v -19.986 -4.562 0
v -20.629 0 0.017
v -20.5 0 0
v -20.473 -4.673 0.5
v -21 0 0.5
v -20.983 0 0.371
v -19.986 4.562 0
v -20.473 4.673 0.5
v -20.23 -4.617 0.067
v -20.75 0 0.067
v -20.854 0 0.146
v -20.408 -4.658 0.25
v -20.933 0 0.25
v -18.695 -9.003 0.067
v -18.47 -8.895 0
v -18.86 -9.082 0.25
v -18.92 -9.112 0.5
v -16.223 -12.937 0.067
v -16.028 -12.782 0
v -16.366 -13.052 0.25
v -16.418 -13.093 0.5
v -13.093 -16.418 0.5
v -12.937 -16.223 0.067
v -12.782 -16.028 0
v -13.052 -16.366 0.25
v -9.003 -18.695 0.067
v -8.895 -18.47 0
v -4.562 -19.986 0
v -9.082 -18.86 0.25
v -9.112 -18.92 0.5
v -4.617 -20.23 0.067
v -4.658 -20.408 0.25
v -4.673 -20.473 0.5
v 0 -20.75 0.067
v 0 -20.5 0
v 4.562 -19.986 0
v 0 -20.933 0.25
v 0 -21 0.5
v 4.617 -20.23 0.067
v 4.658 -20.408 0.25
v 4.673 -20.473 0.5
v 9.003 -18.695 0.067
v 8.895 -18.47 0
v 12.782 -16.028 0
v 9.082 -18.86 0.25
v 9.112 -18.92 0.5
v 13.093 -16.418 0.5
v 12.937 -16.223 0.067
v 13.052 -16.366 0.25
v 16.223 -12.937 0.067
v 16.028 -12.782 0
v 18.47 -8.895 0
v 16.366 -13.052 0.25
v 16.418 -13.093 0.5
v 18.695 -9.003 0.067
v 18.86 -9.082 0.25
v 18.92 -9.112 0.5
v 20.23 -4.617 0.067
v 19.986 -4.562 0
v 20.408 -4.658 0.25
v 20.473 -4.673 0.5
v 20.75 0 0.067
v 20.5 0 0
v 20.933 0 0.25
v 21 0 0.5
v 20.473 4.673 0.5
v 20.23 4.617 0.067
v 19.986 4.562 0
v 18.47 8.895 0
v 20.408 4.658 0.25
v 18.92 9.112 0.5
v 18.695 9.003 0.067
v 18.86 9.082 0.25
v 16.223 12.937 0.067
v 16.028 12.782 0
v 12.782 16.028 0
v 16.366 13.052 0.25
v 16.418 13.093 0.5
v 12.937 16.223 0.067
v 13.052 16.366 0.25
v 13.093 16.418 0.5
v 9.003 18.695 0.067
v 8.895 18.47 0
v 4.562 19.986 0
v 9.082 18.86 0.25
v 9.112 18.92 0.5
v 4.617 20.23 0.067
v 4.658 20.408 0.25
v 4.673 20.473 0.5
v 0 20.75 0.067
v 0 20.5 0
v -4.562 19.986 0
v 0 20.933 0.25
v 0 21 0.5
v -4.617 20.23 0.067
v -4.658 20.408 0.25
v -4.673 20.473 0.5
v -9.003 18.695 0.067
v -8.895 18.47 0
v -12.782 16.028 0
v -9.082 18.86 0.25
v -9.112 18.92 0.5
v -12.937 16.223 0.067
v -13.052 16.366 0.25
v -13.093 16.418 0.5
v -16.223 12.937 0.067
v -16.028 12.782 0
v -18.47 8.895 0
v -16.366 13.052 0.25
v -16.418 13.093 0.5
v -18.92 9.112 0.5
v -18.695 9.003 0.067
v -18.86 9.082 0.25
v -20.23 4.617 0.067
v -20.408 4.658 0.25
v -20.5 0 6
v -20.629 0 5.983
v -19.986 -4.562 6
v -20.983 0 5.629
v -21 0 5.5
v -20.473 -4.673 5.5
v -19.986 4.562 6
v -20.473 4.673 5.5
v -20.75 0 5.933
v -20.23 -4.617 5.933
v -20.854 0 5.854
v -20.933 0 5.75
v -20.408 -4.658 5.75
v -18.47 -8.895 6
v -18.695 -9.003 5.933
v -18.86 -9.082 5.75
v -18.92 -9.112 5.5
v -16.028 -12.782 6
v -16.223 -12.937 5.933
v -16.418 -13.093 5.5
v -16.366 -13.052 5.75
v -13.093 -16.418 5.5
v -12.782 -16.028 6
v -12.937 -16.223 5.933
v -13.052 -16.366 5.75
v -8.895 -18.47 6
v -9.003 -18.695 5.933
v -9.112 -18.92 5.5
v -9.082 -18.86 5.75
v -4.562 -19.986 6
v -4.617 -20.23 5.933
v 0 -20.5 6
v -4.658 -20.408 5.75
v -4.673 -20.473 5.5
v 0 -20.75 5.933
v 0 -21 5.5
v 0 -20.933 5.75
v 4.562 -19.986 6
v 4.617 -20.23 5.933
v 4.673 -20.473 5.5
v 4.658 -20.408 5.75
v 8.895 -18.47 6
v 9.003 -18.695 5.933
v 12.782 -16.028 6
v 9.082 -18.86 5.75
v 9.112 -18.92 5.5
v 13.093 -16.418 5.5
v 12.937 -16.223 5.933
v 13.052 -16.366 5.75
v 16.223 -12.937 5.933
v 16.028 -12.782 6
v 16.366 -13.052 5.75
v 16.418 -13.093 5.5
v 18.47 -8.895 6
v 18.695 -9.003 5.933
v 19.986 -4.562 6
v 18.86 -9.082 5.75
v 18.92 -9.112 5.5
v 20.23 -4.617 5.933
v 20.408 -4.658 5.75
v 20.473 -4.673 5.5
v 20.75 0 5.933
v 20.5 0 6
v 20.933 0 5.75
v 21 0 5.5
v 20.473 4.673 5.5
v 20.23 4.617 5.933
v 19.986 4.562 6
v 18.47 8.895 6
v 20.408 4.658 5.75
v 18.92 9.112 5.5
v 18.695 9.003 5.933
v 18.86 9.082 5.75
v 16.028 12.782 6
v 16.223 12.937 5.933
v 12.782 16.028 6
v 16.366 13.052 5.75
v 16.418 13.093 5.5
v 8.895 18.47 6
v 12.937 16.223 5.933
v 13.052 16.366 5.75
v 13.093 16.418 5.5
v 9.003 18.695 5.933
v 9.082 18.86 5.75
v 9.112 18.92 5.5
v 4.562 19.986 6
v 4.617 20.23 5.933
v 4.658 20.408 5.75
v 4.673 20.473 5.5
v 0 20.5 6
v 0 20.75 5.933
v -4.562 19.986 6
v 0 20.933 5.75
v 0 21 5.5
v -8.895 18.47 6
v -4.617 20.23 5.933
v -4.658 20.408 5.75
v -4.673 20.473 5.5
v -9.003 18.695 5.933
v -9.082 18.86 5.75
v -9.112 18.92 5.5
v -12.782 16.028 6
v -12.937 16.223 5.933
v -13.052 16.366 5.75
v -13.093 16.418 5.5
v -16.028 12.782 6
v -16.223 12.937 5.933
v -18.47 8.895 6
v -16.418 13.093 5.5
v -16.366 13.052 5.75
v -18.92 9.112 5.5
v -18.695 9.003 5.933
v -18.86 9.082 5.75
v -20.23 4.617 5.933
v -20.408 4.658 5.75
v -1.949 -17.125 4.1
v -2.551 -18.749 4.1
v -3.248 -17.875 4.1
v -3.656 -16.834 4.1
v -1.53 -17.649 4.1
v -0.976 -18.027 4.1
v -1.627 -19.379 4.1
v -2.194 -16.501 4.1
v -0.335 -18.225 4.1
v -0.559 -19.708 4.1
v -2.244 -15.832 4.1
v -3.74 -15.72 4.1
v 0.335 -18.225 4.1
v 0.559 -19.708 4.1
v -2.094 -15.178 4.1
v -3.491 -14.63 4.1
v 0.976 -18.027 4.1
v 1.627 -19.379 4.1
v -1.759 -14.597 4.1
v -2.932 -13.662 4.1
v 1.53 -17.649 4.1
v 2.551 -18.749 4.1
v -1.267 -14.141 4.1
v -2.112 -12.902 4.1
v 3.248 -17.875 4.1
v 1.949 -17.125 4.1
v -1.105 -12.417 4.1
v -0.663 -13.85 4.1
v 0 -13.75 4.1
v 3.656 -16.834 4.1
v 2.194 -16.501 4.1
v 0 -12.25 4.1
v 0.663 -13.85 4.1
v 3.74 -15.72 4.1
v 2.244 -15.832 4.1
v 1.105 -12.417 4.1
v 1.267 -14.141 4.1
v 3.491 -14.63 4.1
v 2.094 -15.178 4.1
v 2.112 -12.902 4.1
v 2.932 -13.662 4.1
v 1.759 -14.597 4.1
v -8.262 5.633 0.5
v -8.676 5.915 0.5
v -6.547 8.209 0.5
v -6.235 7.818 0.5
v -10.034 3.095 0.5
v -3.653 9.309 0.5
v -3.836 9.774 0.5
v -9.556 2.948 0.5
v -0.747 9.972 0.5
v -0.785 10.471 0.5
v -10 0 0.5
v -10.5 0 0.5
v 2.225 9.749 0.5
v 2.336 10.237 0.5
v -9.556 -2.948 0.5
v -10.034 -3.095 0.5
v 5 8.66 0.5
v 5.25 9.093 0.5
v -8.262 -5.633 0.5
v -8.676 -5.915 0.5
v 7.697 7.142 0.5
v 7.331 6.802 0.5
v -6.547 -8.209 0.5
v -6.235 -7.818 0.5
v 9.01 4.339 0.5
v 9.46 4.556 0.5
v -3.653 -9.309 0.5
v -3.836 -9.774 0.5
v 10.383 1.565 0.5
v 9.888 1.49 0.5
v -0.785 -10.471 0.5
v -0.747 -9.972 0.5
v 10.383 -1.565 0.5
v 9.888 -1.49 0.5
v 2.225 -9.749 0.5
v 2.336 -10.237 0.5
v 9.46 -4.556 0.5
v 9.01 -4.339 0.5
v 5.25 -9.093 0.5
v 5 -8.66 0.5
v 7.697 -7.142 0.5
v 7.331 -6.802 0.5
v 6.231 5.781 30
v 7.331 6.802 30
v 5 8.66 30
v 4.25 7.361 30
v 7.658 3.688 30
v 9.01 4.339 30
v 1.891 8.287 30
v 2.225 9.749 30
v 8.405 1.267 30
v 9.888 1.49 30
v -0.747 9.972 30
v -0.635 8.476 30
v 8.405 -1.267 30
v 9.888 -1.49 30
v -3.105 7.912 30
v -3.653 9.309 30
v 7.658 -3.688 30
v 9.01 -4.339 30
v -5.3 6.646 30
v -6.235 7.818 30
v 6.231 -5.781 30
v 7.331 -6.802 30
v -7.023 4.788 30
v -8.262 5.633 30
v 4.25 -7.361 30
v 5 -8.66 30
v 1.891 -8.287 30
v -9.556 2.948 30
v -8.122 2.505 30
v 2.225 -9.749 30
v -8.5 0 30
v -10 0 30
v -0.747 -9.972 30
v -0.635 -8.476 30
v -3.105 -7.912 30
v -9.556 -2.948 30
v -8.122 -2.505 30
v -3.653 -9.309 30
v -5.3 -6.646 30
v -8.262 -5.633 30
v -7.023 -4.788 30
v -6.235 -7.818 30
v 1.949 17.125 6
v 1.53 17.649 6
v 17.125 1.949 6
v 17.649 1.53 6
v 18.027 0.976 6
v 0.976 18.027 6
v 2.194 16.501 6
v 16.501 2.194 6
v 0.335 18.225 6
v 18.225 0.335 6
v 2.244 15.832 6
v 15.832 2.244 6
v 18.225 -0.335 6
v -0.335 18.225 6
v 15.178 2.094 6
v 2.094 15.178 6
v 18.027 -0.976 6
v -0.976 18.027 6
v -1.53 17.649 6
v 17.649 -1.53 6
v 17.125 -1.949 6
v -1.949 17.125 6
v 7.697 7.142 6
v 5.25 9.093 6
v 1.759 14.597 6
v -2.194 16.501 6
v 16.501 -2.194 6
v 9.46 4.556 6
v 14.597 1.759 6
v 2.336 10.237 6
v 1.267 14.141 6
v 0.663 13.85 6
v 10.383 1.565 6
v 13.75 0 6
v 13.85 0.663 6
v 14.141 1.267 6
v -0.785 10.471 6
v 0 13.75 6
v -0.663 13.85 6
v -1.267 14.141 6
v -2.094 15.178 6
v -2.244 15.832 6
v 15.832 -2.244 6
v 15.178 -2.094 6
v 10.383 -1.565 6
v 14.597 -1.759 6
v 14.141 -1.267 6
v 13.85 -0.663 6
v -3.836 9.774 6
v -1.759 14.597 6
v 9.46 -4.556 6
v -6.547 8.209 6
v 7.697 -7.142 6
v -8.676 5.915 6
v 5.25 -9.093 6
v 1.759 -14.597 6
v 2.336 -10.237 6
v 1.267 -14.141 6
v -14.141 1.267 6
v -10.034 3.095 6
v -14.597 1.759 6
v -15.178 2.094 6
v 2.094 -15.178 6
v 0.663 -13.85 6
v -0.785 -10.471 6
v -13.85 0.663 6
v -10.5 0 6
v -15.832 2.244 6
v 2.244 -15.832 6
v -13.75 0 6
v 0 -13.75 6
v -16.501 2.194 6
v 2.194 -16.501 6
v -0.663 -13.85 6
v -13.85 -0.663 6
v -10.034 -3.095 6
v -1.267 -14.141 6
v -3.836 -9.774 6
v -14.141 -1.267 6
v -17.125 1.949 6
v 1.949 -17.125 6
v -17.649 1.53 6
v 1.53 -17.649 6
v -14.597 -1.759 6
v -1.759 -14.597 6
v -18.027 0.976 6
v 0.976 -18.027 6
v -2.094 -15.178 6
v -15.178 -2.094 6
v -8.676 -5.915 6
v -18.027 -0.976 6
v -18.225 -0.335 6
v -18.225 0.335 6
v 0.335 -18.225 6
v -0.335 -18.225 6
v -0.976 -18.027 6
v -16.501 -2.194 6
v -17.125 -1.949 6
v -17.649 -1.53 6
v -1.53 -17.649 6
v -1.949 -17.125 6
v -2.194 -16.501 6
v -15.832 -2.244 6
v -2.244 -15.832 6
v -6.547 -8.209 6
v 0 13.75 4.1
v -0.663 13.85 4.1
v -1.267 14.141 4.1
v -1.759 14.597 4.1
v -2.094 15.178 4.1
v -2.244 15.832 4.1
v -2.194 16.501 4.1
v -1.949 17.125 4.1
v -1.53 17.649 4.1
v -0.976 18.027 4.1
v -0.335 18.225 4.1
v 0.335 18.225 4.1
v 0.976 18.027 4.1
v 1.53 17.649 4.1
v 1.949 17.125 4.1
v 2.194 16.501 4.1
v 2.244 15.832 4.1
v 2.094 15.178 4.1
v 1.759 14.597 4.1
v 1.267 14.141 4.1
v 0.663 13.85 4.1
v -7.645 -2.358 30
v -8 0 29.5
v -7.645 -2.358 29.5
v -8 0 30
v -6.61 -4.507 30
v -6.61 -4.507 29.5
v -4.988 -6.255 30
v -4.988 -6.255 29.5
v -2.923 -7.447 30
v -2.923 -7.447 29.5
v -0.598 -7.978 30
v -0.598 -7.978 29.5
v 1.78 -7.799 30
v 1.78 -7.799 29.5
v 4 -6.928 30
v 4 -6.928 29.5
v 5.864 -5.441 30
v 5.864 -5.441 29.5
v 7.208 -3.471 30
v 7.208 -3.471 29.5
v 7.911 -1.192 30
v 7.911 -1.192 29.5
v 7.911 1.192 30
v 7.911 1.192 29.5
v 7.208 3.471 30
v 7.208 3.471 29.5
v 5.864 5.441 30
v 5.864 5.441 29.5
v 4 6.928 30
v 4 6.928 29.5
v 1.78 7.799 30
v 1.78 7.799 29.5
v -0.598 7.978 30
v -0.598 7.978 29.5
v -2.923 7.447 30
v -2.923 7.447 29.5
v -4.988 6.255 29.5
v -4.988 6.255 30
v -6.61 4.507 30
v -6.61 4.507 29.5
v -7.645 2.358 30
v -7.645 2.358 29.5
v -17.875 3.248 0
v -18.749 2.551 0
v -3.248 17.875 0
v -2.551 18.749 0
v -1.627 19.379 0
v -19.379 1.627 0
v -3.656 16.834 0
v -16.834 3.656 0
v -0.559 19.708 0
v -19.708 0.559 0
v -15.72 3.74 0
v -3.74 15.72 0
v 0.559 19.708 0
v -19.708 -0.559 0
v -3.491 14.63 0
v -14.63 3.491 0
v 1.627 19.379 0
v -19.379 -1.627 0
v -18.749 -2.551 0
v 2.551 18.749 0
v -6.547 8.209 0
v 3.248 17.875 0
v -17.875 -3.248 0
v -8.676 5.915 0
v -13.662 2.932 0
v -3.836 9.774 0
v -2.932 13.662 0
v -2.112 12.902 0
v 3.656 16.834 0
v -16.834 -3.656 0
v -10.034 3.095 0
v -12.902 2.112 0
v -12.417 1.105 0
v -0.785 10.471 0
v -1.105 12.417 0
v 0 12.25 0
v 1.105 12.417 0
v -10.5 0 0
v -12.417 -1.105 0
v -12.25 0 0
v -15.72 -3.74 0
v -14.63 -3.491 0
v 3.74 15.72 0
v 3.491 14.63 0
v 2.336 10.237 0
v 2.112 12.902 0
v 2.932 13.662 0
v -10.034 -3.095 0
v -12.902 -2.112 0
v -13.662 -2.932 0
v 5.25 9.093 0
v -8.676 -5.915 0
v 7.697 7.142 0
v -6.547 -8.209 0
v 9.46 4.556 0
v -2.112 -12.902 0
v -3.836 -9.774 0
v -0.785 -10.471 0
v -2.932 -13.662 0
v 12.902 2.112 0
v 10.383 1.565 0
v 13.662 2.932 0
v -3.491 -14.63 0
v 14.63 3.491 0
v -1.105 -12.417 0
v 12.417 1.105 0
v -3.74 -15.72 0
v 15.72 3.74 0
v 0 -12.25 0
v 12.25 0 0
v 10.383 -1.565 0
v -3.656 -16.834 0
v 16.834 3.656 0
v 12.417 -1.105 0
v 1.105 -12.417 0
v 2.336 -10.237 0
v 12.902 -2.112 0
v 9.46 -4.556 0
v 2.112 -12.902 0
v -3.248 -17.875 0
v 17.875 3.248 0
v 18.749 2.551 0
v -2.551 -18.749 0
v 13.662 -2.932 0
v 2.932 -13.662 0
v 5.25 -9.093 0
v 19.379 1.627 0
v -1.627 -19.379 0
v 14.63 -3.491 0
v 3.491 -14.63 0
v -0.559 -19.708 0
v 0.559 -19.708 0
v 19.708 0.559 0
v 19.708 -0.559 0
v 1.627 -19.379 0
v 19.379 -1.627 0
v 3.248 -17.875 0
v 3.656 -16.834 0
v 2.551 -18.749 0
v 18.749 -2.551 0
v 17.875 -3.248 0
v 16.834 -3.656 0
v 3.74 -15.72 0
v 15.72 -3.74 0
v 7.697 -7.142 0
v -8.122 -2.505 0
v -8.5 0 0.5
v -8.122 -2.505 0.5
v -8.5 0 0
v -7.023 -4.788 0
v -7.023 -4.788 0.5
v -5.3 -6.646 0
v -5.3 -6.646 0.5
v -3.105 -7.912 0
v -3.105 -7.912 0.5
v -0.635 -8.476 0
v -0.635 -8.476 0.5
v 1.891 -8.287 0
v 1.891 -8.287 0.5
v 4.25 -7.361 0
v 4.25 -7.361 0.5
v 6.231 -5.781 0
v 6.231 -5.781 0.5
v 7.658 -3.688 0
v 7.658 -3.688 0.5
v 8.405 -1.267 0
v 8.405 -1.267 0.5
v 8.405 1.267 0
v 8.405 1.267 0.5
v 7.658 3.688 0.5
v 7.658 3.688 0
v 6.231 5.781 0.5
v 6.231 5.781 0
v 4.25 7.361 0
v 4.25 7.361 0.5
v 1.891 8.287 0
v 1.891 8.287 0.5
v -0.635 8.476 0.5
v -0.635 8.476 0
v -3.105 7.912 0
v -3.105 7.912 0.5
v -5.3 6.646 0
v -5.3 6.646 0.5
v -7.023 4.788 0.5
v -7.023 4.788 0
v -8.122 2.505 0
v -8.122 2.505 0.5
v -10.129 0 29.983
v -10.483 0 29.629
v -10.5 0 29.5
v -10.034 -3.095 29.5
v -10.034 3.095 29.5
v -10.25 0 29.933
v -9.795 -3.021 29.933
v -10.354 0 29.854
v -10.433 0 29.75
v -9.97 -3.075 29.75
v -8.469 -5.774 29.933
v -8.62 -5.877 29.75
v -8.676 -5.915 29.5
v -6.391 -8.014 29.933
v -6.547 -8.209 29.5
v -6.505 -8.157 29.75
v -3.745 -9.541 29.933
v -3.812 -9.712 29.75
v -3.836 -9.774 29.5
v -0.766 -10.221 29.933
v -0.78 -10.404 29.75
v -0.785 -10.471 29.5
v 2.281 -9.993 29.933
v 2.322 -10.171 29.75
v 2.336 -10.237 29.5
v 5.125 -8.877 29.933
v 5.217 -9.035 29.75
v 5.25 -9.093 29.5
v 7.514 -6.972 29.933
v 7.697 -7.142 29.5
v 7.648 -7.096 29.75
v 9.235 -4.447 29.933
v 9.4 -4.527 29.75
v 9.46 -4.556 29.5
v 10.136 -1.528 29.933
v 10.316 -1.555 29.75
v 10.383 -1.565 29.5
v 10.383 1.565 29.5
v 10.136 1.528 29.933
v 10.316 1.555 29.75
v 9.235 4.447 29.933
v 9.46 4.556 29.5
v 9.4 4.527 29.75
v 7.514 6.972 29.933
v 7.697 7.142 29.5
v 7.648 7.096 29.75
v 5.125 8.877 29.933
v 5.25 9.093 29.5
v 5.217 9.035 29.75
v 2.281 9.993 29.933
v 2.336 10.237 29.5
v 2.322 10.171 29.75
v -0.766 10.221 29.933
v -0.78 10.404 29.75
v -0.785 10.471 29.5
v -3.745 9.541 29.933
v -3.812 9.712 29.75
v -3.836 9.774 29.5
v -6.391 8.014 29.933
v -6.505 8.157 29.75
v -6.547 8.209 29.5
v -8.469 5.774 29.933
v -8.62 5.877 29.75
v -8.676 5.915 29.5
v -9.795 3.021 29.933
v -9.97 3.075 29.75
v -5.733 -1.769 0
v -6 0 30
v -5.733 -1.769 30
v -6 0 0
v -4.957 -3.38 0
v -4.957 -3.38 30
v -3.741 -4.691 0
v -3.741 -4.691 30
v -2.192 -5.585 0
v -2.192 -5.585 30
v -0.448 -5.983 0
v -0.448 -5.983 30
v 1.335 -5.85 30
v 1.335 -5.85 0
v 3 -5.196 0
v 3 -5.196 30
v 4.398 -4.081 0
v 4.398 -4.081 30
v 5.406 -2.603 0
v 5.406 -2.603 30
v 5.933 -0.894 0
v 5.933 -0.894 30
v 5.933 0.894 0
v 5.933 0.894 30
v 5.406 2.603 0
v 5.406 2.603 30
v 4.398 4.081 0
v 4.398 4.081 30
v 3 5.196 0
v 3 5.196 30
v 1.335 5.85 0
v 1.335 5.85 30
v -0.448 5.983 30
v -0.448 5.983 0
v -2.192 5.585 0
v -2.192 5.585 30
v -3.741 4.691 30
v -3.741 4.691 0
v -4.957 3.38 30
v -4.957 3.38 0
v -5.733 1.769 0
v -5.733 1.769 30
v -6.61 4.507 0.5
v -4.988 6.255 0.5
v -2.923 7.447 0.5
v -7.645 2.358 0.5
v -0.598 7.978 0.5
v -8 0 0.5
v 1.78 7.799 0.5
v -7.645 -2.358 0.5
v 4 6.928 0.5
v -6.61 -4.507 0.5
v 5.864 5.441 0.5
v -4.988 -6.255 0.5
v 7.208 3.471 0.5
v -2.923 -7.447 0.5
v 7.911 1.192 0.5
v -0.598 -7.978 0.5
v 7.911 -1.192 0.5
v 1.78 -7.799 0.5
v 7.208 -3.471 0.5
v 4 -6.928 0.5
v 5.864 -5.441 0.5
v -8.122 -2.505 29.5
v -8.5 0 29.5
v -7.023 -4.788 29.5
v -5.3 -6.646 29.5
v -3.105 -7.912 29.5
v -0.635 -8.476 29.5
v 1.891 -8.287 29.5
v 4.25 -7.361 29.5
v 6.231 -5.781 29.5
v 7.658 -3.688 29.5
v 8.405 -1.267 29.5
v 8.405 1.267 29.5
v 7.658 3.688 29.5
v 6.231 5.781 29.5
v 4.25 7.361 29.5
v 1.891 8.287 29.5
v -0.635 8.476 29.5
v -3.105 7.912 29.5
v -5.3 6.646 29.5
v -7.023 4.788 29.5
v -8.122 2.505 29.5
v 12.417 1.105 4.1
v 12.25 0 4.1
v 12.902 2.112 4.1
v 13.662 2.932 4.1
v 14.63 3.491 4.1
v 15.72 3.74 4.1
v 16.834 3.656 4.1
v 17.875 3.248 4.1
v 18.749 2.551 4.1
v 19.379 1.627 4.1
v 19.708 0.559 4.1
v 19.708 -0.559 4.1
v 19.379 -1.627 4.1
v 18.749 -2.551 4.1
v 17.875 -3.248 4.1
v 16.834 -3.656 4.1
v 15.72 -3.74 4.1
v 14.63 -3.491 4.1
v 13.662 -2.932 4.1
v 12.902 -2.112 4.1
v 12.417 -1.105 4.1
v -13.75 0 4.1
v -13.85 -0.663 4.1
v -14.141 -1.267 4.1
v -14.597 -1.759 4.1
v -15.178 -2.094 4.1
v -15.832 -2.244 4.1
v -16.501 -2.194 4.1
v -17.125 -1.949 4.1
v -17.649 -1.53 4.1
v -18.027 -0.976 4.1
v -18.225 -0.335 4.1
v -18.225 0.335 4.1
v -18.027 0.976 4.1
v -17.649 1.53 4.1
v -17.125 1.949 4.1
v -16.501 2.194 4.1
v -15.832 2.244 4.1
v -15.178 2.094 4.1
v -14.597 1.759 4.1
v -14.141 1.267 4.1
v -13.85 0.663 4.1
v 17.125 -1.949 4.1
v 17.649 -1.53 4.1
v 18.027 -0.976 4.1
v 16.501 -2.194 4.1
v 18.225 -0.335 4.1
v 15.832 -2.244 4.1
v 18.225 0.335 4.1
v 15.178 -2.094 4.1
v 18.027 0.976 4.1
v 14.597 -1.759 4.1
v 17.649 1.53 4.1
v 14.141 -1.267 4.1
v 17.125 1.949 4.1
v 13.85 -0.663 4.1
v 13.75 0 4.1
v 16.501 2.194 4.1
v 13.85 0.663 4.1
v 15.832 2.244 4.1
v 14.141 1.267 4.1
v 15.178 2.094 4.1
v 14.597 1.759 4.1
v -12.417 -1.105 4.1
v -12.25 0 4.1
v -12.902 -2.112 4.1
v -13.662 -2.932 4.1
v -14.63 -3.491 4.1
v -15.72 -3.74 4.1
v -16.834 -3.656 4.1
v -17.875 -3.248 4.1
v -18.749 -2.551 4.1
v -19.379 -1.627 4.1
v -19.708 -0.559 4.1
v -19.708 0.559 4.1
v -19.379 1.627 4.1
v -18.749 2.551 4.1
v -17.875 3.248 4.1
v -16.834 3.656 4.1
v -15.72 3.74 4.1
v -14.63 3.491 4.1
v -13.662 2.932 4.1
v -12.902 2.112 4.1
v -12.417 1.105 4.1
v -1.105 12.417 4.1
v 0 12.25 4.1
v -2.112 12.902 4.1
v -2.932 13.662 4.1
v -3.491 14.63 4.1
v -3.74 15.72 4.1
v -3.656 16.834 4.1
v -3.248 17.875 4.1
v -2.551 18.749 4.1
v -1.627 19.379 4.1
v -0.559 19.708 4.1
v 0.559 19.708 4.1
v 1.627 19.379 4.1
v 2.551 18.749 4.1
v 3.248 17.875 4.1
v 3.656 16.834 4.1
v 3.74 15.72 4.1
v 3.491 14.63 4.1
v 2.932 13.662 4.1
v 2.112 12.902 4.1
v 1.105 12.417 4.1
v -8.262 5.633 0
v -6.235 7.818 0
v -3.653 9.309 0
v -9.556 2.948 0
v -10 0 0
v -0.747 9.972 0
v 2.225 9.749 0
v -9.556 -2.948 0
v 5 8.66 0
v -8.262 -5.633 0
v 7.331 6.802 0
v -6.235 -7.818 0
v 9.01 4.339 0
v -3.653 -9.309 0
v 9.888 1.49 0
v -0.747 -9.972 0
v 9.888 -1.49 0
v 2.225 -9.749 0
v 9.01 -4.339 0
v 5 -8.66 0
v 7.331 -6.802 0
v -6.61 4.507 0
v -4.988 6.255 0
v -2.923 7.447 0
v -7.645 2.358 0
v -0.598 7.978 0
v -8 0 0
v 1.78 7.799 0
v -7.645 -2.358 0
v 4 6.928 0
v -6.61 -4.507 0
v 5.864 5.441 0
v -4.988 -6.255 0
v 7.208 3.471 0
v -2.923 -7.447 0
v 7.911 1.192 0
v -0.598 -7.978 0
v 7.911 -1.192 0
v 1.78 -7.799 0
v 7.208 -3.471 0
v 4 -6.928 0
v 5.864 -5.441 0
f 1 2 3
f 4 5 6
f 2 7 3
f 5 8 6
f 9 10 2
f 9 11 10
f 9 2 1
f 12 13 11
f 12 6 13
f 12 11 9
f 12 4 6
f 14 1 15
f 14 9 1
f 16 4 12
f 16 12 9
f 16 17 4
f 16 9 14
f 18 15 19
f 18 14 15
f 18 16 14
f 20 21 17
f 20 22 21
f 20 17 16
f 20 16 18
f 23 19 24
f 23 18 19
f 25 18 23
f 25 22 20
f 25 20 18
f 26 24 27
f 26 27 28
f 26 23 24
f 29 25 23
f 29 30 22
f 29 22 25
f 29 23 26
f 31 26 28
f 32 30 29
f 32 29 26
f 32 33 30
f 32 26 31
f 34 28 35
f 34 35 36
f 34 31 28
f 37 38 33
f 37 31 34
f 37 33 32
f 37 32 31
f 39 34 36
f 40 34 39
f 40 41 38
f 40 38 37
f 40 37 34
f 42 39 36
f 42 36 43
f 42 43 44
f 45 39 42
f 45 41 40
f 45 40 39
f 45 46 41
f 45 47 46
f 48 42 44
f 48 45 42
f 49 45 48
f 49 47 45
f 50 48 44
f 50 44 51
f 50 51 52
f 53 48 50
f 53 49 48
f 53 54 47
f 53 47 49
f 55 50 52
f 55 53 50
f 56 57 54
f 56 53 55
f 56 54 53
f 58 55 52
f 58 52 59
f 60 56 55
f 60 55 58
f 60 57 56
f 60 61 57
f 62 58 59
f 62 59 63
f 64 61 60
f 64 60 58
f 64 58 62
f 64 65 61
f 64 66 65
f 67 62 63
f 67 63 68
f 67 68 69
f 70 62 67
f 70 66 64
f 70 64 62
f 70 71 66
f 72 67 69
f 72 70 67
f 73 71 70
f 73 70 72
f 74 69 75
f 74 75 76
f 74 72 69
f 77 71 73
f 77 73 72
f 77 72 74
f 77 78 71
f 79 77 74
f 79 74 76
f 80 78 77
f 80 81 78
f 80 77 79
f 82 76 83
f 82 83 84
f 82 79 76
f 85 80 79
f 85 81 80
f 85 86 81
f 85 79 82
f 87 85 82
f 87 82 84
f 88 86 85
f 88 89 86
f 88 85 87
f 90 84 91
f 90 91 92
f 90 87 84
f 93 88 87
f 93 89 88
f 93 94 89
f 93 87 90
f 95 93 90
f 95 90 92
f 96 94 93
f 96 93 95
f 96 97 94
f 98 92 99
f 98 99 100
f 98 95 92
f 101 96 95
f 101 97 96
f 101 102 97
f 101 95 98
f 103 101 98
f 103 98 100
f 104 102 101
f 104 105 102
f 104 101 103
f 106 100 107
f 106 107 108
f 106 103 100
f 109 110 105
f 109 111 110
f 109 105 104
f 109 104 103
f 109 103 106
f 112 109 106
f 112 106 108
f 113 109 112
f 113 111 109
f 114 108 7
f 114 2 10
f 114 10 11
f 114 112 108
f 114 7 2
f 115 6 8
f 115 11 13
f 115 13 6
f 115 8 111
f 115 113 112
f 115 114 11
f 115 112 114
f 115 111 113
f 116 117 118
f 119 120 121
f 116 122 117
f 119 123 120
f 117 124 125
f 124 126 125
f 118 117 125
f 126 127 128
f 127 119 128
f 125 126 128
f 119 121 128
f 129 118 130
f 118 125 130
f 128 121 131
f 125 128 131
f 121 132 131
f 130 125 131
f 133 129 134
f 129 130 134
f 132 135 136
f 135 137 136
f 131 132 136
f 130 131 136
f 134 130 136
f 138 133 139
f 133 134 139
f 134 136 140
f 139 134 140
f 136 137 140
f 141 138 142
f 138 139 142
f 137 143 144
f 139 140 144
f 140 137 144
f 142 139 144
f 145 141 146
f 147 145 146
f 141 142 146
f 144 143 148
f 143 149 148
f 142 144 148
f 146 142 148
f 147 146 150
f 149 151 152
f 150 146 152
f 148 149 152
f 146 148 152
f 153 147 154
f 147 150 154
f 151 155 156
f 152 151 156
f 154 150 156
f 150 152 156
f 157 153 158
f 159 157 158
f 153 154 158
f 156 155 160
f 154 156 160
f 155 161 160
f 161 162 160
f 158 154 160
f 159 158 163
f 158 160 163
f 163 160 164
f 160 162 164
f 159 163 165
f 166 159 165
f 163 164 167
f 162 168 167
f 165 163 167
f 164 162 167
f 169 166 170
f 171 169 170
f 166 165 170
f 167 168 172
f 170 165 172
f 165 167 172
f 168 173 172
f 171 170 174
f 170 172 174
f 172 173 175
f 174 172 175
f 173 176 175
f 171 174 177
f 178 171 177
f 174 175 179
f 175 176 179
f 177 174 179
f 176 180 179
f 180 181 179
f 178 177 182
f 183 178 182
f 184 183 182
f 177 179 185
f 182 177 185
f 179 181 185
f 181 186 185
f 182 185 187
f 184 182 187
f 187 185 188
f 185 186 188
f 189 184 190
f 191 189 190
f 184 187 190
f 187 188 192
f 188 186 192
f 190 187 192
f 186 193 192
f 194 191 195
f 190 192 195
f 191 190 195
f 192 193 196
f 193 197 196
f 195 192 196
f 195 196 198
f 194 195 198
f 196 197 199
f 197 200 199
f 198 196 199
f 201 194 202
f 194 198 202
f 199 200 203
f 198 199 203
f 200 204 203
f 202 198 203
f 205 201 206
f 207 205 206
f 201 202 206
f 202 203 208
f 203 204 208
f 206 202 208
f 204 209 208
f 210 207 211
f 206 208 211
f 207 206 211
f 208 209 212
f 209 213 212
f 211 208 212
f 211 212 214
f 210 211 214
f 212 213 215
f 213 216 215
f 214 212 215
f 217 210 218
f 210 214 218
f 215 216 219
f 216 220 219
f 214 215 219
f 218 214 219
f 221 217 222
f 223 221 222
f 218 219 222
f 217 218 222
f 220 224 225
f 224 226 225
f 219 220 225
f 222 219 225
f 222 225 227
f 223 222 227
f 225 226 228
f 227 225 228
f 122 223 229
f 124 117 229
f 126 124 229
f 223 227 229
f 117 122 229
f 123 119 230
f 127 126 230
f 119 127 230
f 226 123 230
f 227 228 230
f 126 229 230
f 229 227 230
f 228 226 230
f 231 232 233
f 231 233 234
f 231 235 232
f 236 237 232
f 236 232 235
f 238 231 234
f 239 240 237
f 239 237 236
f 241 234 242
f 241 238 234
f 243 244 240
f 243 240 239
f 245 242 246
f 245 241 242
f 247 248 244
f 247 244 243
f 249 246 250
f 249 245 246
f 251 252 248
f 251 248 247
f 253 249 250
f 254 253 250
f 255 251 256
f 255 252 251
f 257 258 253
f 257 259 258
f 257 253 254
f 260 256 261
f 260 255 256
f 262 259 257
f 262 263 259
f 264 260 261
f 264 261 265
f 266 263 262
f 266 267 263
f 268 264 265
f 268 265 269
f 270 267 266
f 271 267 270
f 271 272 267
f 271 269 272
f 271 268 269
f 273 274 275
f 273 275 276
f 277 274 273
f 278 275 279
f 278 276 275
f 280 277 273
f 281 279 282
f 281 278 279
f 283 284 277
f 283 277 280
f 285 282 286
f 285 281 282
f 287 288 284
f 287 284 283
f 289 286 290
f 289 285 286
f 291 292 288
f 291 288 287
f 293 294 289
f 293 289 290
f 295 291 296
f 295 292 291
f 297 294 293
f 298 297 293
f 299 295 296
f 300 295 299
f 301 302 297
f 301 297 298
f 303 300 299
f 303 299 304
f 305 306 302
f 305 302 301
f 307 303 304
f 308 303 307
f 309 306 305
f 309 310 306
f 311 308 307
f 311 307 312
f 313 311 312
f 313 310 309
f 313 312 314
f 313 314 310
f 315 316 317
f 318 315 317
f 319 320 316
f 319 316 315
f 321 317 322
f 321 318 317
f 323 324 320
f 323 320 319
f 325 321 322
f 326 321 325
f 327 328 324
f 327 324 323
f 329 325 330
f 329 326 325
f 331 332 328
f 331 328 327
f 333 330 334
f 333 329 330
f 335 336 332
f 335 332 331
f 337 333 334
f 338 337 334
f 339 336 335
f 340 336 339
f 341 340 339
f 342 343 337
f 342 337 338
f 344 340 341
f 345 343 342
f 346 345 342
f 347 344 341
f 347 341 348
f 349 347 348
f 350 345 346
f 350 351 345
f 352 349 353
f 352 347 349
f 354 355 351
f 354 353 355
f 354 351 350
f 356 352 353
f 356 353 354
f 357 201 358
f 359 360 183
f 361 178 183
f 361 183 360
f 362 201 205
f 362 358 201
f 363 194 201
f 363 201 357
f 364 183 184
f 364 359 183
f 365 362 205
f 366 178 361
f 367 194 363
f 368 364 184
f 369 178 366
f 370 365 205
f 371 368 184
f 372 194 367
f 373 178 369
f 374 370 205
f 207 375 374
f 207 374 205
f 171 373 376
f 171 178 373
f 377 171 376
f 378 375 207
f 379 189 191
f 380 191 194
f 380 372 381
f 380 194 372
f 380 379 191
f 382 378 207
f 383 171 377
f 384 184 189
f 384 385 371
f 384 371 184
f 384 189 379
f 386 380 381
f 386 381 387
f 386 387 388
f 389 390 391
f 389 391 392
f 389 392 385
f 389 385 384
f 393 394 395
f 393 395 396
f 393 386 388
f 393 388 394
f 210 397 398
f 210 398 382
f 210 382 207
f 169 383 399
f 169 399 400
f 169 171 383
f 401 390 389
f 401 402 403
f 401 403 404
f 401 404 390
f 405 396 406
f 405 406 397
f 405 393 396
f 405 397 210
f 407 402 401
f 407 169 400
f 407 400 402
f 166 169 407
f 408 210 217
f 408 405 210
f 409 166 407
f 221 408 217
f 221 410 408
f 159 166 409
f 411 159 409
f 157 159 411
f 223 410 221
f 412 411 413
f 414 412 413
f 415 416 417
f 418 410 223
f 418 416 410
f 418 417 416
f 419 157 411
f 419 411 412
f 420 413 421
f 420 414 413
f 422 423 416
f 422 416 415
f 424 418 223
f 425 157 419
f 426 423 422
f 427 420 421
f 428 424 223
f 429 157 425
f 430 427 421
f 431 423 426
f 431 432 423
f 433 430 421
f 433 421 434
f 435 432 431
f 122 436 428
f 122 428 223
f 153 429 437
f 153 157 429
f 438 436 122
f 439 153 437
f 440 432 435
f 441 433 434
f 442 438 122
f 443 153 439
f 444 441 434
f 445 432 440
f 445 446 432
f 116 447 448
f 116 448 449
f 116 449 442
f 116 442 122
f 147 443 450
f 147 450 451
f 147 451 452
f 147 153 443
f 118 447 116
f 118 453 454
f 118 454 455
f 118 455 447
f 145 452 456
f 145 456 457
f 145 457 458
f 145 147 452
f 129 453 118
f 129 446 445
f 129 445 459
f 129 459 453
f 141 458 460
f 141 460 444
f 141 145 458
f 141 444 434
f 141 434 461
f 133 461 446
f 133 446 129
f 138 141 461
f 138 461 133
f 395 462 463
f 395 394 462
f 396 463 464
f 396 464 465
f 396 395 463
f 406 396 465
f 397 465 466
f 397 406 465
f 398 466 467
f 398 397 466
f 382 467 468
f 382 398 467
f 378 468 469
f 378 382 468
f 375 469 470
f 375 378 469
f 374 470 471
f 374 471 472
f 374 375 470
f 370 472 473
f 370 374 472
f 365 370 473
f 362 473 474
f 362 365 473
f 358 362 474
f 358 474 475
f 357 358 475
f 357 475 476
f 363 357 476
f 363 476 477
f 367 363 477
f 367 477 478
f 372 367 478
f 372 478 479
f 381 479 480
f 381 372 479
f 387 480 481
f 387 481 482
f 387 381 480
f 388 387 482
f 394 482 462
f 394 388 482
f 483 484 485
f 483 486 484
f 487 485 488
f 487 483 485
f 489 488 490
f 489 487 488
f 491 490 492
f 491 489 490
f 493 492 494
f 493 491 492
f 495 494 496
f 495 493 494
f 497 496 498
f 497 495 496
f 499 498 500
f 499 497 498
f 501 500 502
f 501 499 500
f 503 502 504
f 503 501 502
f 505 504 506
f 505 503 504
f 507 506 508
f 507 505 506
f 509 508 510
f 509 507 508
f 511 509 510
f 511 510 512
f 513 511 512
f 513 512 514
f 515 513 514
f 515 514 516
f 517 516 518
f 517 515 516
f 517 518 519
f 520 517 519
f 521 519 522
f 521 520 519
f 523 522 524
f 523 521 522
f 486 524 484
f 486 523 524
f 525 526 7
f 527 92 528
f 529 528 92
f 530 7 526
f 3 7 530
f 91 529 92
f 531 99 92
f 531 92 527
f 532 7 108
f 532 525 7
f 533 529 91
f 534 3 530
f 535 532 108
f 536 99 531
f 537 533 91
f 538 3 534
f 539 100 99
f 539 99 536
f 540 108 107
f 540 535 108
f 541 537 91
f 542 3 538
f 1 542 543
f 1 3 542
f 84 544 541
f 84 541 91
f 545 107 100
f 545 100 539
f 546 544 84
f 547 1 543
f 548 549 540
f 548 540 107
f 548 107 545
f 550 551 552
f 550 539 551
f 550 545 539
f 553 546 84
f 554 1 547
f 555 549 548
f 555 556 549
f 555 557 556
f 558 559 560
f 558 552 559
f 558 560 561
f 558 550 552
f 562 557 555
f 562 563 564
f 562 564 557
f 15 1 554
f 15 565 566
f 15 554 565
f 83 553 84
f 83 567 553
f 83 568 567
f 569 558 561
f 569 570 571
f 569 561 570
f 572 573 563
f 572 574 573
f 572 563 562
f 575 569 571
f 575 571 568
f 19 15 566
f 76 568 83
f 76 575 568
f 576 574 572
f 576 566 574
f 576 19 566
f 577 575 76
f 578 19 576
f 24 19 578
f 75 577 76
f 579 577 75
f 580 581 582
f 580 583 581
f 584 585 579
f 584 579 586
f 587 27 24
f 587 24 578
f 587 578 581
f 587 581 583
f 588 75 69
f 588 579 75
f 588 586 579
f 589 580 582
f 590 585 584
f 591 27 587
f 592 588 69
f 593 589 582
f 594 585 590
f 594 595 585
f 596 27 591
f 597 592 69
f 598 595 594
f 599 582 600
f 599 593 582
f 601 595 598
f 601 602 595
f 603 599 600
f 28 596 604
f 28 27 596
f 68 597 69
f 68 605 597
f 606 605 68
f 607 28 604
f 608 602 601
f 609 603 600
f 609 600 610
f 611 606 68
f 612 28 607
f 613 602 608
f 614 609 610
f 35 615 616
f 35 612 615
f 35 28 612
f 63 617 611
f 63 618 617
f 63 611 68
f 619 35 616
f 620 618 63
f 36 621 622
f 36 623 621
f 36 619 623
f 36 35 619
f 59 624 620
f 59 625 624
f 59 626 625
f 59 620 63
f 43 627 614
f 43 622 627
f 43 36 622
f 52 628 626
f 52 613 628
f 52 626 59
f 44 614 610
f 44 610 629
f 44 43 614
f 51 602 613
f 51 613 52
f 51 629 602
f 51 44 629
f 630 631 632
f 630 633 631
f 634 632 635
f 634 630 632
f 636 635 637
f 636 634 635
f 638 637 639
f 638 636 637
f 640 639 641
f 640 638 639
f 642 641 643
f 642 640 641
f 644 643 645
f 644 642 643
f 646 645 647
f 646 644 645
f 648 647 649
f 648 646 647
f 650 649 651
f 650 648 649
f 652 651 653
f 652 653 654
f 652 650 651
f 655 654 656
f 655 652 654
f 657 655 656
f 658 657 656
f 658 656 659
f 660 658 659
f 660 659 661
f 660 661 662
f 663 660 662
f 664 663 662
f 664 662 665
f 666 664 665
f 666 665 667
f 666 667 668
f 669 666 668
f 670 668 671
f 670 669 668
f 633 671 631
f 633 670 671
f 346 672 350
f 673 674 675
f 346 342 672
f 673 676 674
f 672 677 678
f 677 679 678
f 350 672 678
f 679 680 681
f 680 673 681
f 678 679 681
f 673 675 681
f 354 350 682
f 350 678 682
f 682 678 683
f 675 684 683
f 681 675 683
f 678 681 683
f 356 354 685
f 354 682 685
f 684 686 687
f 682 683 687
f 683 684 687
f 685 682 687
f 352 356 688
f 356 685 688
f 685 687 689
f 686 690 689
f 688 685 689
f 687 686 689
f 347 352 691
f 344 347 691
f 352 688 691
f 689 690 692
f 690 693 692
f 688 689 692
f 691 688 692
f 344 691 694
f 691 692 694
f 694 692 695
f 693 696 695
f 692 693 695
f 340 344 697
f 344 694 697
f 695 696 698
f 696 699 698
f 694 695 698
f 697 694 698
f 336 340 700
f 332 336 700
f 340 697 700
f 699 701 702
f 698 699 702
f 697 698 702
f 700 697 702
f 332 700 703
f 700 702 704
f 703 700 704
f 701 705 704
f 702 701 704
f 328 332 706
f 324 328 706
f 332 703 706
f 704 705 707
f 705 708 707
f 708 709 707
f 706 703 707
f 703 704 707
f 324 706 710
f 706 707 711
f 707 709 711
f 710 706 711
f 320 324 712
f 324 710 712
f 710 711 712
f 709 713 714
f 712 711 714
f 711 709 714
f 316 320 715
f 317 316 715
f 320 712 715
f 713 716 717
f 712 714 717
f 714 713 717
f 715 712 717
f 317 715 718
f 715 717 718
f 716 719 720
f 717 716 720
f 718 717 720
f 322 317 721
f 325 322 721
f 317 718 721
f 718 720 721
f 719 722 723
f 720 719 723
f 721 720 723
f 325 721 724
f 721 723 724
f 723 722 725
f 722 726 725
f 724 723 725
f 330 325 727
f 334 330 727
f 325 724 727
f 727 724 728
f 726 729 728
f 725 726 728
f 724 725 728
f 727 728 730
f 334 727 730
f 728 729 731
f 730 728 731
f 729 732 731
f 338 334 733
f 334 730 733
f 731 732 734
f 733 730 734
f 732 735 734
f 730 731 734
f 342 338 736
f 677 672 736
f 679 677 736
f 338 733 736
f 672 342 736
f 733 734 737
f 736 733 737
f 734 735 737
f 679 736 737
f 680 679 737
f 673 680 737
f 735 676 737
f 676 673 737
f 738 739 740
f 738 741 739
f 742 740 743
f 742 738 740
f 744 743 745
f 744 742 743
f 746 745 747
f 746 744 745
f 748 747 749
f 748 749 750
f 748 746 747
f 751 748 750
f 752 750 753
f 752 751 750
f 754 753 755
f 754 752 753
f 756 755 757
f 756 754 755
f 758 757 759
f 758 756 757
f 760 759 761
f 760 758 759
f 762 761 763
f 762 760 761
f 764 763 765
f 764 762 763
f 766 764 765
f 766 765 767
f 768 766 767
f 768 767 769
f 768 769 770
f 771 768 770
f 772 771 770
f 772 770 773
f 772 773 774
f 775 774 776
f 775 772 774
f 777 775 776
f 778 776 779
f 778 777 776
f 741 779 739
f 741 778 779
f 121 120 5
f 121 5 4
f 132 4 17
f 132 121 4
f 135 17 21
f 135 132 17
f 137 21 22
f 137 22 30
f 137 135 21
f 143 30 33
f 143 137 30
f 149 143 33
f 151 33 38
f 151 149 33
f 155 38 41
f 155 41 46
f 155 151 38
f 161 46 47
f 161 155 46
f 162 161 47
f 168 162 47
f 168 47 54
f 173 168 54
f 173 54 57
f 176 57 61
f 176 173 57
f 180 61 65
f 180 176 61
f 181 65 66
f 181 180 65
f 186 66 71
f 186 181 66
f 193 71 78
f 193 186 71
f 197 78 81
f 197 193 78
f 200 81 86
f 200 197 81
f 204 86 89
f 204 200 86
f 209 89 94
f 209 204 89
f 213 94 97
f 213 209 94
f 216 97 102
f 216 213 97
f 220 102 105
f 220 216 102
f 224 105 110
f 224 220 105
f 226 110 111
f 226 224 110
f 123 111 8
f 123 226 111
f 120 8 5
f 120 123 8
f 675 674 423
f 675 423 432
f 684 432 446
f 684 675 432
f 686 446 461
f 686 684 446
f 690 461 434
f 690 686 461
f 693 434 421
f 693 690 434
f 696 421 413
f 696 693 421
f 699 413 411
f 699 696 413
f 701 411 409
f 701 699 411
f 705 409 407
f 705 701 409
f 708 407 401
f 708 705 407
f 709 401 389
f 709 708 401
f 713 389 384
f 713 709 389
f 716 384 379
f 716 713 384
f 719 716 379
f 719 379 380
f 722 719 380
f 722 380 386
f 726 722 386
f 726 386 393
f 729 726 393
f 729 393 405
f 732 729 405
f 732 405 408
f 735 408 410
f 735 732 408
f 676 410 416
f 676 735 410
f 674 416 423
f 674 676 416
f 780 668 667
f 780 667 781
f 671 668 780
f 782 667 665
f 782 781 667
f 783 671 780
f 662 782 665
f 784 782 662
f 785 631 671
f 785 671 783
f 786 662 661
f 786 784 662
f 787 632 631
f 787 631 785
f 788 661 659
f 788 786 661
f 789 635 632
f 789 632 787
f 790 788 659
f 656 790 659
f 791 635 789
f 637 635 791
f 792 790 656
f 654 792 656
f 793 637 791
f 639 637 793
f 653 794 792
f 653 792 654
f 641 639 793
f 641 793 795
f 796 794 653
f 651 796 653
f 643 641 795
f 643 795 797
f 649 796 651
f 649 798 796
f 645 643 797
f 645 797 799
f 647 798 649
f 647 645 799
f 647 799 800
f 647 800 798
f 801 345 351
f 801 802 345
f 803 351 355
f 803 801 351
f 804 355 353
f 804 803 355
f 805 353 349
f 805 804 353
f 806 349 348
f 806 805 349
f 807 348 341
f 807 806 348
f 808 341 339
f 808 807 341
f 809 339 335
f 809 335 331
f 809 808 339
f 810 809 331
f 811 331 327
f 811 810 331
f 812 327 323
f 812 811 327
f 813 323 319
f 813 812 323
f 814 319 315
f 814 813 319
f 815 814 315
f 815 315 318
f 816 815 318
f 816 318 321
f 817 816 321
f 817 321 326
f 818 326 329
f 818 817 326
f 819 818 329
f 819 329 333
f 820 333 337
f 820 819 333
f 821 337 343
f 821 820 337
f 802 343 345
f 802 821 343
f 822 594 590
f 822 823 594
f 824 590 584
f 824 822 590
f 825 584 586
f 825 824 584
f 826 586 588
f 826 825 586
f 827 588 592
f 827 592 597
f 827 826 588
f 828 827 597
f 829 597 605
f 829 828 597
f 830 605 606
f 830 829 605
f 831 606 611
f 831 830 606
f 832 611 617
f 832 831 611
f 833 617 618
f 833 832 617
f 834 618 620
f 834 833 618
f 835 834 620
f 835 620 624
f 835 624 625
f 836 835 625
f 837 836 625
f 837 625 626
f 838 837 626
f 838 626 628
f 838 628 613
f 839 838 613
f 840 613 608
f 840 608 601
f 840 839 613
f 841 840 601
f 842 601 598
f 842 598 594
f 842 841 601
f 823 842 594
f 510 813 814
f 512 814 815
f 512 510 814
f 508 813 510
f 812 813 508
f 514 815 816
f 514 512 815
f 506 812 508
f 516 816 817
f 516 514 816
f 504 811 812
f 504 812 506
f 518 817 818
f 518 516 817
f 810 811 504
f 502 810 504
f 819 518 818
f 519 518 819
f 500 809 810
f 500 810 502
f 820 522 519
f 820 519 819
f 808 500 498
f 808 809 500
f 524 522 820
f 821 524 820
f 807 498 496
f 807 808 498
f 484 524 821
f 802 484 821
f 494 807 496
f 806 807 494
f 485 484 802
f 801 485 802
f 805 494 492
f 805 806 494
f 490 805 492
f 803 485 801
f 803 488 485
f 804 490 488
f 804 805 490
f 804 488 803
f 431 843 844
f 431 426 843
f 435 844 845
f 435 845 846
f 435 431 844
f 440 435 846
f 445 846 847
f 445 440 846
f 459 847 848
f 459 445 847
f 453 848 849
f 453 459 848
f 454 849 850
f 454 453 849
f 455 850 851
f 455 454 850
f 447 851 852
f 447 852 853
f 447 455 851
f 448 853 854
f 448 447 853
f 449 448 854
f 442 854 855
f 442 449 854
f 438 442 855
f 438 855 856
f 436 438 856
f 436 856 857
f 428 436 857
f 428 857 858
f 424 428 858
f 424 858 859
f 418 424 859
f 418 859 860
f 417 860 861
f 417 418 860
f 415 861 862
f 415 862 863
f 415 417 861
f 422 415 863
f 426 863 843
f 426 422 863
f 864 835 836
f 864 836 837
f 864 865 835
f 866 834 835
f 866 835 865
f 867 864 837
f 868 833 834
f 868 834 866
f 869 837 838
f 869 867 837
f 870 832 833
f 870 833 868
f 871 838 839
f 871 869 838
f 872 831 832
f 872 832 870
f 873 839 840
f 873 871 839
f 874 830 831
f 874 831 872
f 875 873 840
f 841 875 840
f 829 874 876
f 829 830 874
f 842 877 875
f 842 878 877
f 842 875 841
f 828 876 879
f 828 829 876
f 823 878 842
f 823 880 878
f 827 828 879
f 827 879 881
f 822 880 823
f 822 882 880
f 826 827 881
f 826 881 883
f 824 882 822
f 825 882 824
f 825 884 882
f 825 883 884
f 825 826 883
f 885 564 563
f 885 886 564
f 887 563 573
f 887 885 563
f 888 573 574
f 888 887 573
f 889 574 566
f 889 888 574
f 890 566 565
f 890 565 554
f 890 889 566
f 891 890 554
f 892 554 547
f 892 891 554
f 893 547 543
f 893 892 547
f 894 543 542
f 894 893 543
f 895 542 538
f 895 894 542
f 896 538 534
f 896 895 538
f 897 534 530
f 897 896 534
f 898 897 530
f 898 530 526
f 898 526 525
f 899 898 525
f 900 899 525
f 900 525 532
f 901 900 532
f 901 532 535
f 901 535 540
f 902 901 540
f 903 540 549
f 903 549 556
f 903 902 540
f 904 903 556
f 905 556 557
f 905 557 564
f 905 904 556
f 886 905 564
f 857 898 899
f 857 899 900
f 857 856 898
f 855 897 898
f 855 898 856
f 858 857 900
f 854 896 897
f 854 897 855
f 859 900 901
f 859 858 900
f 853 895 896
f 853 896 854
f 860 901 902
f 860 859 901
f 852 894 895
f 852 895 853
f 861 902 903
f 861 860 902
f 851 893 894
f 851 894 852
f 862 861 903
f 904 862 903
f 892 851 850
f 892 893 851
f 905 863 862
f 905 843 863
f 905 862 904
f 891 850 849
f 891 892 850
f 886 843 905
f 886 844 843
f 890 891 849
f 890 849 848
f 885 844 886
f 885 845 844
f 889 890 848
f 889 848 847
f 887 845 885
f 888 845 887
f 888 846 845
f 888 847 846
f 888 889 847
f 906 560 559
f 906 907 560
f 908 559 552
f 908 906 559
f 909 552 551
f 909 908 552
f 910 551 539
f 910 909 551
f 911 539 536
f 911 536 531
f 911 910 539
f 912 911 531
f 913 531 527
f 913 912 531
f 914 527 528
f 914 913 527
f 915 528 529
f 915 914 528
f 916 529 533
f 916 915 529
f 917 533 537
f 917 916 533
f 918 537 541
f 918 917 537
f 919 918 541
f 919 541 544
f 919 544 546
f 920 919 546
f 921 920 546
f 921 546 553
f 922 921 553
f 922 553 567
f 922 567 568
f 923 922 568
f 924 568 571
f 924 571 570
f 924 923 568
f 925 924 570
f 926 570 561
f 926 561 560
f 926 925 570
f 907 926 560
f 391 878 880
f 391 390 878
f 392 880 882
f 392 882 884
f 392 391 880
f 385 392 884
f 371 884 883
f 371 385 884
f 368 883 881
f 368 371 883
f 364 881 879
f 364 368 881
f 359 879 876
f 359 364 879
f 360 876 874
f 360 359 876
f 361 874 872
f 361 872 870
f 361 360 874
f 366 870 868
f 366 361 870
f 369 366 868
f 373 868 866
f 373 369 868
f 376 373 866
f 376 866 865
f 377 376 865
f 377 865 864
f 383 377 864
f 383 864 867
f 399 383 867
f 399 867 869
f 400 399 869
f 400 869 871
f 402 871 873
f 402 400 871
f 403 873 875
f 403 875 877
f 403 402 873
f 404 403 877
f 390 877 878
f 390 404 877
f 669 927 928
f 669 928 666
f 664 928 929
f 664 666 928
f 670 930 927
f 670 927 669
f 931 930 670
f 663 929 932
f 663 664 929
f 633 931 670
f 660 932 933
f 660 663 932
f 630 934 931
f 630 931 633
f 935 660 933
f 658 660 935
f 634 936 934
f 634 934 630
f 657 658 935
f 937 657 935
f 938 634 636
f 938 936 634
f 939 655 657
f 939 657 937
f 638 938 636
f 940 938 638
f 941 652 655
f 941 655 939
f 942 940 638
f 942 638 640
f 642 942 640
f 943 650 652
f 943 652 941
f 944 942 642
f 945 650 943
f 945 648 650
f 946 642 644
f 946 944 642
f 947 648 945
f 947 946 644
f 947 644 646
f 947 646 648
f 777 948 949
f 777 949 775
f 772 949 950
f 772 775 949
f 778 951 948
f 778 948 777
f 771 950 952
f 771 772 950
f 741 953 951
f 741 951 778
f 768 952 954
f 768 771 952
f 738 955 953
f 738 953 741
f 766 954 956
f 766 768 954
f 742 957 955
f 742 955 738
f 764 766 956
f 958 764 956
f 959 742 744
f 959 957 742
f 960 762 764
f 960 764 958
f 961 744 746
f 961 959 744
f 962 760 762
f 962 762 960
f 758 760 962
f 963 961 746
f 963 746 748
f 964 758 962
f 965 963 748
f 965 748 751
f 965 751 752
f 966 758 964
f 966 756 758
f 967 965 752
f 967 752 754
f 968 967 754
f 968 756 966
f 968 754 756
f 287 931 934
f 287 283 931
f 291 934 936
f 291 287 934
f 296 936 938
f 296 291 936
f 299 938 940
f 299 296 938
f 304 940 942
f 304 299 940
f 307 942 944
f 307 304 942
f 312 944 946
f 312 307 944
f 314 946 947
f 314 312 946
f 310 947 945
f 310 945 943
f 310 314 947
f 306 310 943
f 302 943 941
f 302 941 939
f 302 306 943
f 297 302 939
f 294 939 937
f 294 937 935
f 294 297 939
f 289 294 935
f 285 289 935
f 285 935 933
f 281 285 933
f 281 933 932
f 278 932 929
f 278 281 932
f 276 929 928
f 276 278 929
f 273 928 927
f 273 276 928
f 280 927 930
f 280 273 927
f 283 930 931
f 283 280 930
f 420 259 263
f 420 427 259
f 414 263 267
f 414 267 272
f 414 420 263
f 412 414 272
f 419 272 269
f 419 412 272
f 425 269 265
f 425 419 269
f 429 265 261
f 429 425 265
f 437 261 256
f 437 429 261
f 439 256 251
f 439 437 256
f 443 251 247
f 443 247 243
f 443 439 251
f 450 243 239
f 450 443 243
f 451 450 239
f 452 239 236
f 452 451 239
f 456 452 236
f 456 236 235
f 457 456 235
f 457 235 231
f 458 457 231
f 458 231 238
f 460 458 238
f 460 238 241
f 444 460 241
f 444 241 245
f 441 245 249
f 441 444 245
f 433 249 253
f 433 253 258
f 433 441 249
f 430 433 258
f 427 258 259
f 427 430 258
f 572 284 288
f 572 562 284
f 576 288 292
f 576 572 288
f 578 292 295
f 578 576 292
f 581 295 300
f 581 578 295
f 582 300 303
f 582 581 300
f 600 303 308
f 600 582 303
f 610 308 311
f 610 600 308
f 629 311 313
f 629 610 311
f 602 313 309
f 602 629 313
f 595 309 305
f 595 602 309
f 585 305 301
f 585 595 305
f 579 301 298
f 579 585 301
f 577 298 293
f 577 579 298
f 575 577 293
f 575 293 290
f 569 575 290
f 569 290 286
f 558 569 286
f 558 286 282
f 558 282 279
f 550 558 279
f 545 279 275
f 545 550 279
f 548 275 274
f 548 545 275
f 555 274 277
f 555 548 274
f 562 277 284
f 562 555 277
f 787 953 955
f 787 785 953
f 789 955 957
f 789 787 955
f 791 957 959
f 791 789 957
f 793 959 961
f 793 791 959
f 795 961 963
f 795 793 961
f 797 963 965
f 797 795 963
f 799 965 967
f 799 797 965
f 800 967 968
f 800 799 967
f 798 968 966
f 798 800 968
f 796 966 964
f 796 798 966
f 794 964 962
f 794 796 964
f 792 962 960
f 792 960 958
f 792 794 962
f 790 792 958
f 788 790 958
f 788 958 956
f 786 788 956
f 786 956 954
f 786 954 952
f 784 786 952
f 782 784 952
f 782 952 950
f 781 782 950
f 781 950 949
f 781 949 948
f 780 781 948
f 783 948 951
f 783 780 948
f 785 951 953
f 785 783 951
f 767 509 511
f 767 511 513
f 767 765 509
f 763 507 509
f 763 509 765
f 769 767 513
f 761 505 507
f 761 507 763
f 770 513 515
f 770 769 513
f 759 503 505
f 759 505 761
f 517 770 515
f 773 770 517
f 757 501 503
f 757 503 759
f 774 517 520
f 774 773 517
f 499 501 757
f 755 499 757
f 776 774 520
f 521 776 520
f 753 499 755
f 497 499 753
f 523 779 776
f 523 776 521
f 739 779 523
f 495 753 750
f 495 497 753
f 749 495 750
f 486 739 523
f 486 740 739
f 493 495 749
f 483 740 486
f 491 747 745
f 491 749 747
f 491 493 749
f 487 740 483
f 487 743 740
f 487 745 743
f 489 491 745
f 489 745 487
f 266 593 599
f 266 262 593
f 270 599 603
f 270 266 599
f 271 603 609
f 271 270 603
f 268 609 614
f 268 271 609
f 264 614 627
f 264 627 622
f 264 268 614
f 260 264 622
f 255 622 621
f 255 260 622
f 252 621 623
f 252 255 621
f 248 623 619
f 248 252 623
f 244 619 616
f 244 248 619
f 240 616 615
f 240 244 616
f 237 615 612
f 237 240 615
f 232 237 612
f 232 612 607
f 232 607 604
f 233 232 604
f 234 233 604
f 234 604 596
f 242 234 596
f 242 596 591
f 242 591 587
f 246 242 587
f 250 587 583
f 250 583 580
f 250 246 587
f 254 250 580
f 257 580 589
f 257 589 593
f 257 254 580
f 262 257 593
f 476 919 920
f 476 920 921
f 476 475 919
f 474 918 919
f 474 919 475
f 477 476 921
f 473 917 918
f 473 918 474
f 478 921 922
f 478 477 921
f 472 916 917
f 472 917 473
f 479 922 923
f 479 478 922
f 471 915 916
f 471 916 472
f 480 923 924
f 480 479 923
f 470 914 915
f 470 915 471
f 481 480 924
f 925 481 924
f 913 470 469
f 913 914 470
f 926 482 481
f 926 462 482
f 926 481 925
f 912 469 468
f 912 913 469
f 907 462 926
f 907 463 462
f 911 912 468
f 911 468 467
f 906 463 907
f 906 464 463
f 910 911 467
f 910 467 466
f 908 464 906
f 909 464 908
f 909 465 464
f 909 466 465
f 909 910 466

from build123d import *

# Parameters (mm, degrees)
PADR_OCIRCULAR1_COUNT = 4
FILETE1_R             = 0.5


with BuildPart() as part:
    # Esboço1 → Revolução1 (revolve)
    with BuildSketch(Plane(origin=(0, 0, 0), x_dir=(0, 0, -1), z_dir=(1, 0, 0)), mode=Mode.PRIVATE) as revolu_o1_sk:
        Polygon((0, 6), (0, 8), (-0.5, 8), (-0.5, 8.5), (0, 8.5), (0, 10), (-0.5, 10), (-0.5, 10.5), (0, 10.5), (0, 21), (-6, 21), (-6, 10.5), (-30, 10.5), (-30, 8.5), (-29.5, 8.5), (-29.5, 8), (-30, 8), (-30, 6), align=None)
    revolve(revolu_o1_sk.sketch.rotate(Axis((0, 0, 0), (0, 0, 1)), 90), axis=Axis((0, 0, 0), (0, 0, 1)))  # turned: the seam where the file's is

    # Esboço5 → Corte-Revolução1 (revolve, cut)
    with BuildSketch(Plane(origin=(0, 0, 0), x_dir=(0, 0, -1), z_dir=(1, 0, 0)), mode=Mode.PRIVATE) as corte_revolu_o1_sk:
        Polygon((0, 19.75), (-4.1, 19.75), (-4.1, 18.25), (-6, 18.25), (-6, 16), (0, 16), align=None)
    corte_revolu_o1 = revolve(corte_revolu_o1_sk.sketch.rotate(Axis((0, 16, 0), (0, 0, -1)), 180), axis=Axis((0, 16, 0), (0, 0, -1)), mode=Mode.SUBTRACT)  # turned: the seam where the file's is

    # PadrãoCircular1: Corte-Revolução1 ×4 about axis
    padr_ocircular1_axis = Axis((0, 0, 0), (0, 0, 1))
    for i in range(1, PADR_OCIRCULAR1_COUNT):
        add(corte_revolu_o1.rotate(padr_ocircular1_axis, i * 360 / PADR_OCIRCULAR1_COUNT), mode=Mode.SUBTRACT)

    # Filete1
    filete1_edges = [part.edges().sort_by_distance(p)[0] for p in [
        (10.5, 0, 30),
        (21, 0, 6),
        (21, 0, 0),
    ]]
    fillet(filete1_edges, radius=FILETE1_R)


solid = part.part
